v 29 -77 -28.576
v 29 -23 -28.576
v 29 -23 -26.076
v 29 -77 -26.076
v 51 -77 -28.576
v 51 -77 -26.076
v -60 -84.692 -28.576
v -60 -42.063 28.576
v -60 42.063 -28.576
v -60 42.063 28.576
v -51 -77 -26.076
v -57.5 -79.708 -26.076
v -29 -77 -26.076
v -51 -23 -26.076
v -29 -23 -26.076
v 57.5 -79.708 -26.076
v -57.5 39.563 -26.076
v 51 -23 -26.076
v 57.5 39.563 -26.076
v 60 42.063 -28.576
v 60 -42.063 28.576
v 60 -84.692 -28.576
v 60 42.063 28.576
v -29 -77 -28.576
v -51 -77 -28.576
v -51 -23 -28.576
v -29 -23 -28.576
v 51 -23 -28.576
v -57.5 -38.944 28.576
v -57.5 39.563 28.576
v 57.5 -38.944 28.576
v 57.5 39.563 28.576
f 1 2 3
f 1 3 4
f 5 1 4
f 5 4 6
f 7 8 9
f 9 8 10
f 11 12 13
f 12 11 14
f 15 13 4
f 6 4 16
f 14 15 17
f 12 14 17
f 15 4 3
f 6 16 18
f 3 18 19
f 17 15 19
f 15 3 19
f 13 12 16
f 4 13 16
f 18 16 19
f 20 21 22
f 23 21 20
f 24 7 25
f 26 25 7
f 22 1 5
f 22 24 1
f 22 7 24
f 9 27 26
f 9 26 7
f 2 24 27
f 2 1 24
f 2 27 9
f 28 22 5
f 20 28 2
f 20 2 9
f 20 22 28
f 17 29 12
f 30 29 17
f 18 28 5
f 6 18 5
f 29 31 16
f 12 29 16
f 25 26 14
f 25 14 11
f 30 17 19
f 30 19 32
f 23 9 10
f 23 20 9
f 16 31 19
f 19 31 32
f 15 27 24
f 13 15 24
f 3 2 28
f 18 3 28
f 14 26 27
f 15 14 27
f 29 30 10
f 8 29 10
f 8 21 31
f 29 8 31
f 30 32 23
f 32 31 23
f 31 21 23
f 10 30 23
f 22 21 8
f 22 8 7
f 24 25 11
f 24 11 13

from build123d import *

# Parameters (mm, degrees)
F1_DEPTH = 60
F0_W     = 84.12575
F0_H     = 57.152696
F2_DEPTH = 60
F3_T     = -2.5
F4_W     = 22
F4_H     = 54
F5_DEPTH = 5


with BuildPart() as f1:
    # F0 (on Right) → F1 (new body, symmetric)
    with BuildSketch(Plane.YZ):
        Polygon((-42.062875, -28.576348), (-42.062875, 28.576348), (-84.691621, -28.576348), align=None)
    extrude(amount=F1_DEPTH, both=True)

    # F0 (on Right) → F2 (join, symmetric)
    with BuildSketch(Plane.YZ):
        Rectangle(F0_W, F0_H)
        Polygon((-42.062875, -28.576348), (-42.062875, 28.576348), (-84.691621, -28.576348), align=None)
    extrude(amount=F2_DEPTH, both=True)

    # F3
    f3_openings = [f1.faces().sort_by_distance(p)[0] for p in [
        (0, 0, 28.576348),
    ]]
    offset(amount=F3_T, openings=f3_openings)

    # F4 (on face) → F5 (cut)
    with BuildSketch(Plane(origin=(0, 0, -28.576348), x_dir=(1, 0, 0), z_dir=(0, 0, -1))):
        with Locations((-40, 50)):
            Rectangle(F4_W, F4_H)
        with Locations((40, 50)):
            Rectangle(F4_W, F4_H)
    extrude(amount=-F5_DEPTH, mode=Mode.SUBTRACT)


solid = f1.part
